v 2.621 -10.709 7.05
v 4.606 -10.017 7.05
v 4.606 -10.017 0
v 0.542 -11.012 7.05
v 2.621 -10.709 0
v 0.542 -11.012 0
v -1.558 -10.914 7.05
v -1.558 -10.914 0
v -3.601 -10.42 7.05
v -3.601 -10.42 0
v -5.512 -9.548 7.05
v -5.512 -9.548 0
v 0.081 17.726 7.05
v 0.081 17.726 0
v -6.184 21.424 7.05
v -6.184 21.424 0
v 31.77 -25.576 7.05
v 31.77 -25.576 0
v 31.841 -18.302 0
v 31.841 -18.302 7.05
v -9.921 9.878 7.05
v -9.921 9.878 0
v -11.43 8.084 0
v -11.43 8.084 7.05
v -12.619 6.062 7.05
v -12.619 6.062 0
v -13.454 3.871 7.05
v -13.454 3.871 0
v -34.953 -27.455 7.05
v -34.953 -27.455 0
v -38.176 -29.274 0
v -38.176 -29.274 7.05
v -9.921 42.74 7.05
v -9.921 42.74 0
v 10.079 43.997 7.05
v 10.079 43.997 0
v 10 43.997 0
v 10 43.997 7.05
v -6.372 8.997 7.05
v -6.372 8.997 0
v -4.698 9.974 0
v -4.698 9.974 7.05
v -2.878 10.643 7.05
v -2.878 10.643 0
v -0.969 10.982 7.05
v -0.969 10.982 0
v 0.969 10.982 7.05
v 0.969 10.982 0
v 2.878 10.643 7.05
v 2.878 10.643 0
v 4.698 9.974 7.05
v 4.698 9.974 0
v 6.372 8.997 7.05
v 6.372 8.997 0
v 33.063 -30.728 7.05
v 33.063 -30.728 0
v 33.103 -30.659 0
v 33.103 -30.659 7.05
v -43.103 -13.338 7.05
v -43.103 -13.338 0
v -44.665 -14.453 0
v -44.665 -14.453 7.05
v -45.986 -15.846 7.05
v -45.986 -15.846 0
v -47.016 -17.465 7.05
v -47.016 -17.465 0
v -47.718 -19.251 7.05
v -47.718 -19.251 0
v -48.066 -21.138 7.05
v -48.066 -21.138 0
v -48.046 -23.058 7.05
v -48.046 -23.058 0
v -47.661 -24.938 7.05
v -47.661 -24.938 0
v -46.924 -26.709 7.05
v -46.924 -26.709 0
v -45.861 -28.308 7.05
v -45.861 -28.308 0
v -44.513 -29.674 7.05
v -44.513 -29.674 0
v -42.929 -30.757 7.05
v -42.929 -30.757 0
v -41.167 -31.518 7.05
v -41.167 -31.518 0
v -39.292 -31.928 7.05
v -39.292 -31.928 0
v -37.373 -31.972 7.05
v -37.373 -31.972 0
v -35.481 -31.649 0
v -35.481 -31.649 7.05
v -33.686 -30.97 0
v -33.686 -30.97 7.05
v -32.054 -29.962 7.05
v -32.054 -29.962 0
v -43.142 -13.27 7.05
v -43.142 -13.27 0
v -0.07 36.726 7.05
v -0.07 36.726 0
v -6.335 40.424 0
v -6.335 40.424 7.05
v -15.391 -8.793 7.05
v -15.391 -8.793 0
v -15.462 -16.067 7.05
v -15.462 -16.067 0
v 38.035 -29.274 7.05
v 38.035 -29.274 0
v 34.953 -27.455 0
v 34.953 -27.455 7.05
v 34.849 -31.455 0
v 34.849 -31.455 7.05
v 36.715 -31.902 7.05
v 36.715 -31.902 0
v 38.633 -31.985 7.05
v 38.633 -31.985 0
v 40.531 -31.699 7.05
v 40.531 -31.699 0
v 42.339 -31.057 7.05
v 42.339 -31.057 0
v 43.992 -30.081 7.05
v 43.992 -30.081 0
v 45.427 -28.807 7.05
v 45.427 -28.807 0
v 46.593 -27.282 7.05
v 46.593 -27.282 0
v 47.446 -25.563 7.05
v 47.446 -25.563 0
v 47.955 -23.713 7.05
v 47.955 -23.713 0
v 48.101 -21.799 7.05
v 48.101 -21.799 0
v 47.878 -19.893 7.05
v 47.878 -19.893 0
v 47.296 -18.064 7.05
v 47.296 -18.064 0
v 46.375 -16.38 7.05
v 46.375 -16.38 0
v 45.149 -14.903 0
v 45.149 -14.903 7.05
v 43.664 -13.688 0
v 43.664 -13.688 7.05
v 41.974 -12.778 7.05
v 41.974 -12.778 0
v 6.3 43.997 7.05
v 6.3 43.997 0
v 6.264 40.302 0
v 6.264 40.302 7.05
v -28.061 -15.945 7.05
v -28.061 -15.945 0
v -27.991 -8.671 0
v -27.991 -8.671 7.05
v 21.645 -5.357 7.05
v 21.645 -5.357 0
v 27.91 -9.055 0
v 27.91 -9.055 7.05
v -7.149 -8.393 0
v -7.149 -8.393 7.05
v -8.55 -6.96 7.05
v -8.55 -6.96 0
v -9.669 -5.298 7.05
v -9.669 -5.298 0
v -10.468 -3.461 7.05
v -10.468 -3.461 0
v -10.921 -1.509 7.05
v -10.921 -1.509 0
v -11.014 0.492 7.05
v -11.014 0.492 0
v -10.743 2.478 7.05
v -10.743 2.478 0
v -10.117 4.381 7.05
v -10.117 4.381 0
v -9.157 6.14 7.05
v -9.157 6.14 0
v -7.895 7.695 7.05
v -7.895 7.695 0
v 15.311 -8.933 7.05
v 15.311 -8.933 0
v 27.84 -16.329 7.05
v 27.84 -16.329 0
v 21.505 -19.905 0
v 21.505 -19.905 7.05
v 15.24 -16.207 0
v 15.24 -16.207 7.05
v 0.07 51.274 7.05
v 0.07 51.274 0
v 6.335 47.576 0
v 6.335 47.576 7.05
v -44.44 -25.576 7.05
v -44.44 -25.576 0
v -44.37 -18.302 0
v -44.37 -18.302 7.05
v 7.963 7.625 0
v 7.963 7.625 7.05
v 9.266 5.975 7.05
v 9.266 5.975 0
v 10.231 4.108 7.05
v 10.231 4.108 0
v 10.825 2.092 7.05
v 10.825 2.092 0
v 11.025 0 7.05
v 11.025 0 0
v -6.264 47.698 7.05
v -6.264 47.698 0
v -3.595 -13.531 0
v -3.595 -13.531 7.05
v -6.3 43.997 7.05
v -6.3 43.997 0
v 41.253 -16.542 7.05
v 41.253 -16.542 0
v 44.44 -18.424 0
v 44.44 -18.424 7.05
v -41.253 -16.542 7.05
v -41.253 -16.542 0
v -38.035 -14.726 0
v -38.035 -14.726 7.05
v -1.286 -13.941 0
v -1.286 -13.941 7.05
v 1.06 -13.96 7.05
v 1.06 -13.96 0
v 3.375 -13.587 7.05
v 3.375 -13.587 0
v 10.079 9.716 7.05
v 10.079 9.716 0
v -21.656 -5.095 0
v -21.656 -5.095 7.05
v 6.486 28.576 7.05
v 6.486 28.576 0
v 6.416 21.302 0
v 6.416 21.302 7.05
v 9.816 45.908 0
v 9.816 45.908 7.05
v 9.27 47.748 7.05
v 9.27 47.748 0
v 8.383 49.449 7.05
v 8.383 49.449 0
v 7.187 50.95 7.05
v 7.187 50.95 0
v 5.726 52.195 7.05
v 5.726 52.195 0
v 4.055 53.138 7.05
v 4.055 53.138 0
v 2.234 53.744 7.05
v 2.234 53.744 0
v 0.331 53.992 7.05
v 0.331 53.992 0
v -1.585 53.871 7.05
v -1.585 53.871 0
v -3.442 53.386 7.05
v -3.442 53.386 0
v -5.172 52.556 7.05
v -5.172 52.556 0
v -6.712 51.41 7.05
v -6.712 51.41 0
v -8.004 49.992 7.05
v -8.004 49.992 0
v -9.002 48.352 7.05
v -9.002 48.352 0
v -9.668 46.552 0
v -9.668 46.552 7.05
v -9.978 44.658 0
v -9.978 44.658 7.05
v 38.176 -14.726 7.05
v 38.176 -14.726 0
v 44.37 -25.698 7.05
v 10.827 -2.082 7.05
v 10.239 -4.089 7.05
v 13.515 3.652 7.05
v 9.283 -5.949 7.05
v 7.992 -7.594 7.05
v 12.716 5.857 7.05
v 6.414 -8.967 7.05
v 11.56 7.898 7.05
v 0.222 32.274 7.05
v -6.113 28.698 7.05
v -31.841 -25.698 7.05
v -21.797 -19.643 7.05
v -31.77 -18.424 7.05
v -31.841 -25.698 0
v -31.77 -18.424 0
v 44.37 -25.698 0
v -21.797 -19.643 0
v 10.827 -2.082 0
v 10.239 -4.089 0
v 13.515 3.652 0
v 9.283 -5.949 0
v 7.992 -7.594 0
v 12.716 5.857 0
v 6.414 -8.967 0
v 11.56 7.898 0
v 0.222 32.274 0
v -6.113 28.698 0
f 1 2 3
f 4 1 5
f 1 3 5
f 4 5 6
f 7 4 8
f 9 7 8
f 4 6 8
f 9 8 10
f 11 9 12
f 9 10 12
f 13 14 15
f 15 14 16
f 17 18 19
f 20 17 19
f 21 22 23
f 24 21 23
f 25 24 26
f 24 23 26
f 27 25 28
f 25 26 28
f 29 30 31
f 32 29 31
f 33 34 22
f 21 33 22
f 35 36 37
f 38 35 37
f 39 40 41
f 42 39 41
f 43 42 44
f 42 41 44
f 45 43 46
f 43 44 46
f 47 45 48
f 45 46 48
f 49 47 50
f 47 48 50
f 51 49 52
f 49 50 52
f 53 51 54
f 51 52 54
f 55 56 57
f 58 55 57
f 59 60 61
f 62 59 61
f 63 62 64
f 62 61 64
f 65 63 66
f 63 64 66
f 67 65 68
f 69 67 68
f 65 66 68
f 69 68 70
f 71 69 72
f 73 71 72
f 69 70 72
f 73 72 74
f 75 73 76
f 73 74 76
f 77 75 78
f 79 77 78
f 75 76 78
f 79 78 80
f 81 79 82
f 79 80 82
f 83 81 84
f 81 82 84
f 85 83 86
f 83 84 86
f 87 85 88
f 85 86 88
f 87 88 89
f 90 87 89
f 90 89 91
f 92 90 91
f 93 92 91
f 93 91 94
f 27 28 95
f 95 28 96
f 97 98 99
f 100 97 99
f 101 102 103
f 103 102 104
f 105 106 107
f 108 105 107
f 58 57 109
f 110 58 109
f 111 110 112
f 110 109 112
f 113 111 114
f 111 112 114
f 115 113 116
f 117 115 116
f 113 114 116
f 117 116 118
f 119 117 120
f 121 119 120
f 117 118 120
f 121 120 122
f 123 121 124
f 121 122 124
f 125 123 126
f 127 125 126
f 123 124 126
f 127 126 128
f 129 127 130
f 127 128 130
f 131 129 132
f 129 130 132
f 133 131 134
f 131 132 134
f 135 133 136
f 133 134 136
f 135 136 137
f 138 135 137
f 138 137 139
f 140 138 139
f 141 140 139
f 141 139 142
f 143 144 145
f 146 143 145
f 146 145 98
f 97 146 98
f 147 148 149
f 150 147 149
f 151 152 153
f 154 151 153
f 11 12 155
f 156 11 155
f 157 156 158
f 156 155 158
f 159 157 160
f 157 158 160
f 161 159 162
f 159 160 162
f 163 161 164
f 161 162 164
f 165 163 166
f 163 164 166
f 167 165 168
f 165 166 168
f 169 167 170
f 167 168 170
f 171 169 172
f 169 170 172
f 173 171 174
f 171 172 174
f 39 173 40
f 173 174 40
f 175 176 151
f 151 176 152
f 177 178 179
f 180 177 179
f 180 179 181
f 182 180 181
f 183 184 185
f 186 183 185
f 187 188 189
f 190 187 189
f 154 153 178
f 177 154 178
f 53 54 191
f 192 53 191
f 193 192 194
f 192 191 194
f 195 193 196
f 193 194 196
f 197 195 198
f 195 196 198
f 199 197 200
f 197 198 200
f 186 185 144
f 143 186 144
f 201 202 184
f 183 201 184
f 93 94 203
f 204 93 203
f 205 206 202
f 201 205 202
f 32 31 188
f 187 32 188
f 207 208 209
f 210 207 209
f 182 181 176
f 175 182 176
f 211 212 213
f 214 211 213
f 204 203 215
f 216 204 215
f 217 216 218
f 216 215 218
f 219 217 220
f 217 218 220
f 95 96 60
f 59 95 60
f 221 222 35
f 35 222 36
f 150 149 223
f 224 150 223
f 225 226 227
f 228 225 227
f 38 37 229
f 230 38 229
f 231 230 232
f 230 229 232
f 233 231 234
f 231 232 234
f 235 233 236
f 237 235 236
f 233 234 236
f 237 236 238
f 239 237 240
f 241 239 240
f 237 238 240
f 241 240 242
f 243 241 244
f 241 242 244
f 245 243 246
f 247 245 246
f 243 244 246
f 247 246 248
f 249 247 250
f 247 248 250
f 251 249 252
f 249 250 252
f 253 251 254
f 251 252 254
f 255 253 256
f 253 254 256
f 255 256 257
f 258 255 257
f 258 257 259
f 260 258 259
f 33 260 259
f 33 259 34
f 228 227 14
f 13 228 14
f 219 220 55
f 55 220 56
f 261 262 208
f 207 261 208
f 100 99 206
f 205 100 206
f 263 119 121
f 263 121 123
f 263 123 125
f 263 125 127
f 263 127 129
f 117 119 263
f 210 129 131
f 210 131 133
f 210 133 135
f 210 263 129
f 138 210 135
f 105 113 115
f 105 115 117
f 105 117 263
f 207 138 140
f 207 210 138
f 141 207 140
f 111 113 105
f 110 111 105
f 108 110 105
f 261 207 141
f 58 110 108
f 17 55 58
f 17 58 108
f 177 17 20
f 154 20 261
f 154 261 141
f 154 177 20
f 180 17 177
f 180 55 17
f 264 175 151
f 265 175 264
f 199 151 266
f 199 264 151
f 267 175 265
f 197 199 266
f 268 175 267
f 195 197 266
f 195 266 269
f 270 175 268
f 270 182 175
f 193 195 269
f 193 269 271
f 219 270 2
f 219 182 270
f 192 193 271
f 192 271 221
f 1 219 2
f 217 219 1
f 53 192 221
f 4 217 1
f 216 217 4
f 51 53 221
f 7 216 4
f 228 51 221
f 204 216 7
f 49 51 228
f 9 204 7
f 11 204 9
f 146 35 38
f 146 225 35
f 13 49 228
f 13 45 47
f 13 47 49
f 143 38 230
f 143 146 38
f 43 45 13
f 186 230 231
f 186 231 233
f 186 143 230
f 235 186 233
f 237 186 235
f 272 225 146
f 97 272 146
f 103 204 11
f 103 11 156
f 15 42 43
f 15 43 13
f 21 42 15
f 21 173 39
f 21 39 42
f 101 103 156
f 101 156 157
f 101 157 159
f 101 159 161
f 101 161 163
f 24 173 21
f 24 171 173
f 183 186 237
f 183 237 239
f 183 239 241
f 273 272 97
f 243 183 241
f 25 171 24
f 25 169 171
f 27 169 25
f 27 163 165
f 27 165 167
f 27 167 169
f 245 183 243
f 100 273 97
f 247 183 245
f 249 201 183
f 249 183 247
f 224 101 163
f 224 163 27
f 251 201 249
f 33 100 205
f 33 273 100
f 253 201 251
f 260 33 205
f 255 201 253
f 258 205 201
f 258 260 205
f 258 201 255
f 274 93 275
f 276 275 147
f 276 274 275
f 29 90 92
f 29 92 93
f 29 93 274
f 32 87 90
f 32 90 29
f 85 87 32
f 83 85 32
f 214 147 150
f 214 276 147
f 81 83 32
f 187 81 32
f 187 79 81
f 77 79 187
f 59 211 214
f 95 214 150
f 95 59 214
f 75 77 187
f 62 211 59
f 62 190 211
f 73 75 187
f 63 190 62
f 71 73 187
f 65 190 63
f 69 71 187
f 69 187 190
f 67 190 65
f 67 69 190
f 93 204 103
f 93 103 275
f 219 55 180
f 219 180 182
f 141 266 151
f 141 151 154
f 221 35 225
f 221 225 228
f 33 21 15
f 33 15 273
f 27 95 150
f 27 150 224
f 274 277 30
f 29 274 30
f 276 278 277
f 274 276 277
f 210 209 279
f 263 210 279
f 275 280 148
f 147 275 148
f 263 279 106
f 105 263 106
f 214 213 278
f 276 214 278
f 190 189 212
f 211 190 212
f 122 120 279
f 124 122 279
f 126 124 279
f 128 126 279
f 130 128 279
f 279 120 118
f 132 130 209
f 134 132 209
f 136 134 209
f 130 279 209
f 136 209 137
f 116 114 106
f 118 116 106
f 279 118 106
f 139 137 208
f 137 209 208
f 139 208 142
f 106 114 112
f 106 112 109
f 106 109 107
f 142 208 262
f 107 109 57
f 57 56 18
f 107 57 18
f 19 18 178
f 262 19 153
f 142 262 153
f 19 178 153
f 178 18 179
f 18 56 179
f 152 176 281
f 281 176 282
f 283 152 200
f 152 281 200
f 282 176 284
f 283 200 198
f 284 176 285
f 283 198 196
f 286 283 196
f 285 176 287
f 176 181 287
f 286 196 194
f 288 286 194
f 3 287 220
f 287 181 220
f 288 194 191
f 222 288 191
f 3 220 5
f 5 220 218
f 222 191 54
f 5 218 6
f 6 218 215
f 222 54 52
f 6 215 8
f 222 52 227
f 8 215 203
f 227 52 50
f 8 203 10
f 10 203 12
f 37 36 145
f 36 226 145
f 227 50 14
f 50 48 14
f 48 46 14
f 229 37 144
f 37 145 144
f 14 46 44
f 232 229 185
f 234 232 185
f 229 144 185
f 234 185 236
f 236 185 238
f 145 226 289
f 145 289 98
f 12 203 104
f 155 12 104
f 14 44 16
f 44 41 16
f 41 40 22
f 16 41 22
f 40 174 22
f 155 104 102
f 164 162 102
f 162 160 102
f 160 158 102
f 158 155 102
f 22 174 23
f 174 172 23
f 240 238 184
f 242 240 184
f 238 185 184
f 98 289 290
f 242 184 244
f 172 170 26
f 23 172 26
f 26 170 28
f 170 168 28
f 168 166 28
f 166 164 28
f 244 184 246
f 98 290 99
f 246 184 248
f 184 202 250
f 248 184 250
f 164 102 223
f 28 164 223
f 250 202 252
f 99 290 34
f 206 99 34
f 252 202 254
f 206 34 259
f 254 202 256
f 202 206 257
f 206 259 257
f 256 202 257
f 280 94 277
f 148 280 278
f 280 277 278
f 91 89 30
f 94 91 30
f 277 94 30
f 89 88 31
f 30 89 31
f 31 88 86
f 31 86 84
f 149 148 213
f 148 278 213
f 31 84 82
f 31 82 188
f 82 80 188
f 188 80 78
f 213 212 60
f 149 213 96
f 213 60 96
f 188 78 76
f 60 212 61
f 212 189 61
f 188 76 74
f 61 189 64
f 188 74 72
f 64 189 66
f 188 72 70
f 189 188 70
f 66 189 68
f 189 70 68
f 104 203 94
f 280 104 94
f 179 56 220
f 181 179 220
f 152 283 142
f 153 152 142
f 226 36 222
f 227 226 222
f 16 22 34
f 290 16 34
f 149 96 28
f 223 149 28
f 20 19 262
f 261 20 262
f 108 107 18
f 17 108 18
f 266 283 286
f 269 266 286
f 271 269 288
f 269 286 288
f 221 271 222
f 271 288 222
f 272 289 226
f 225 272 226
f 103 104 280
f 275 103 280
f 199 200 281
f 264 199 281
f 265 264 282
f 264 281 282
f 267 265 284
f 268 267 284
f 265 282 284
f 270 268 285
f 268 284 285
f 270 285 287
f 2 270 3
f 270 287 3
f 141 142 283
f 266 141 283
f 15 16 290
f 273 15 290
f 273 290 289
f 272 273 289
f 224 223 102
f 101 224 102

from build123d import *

# Parameters (mm, degrees)
F1_DEPTH = 7.05
F2_COUNT = 3


with BuildPart() as f1:
    # F0 (on Top) → F1 (new body)
    with BuildSketch(Plane.XY):
        with BuildLine():
            ThreePointArc((10, 43.9972005226), (-0.6298612389, 53.9773445506), (-9.9206549639, 42.7399793461))
            Line((-9.9206549639, 42.7399793461), (-9.9206549639, 43.9972005226))
            Line((-9.9206549639, 43.9972005226), (-6.3003222272, 43.9972005226))
            Line((-6.3003222272, 43.9972005226), (-6.2644989641, 47.6981147533))
            Line((-6.2644989641, 47.6981147533), (0.0704118404, 51.2742726216))
            Line((0.0704118404, 51.2742726216), (6.3349108045, 47.5761578682))
            Line((6.3349108045, 47.5761578682), (6.3002680318, 43.9972005226))
            Line((6.3002680318, 43.9972005226), (10, 43.9972005226))
        make_face()
        with BuildLine():
            Line((-9.9206549639, 43.9972005226), (-9.9206549639, 42.7399793461))
            ThreePointArc((-9.9206549639, 42.7399793461), (0.6298612389, 34.0170564946), (10, 43.9972005226))
            Line((10, 43.9972005226), (6.3002680318, 43.9972005226))
            Line((6.3002680318, 43.9972005226), (6.2644989641, 40.3018852467))
            Line((6.2644989641, 40.3018852467), (-0.0704118404, 36.7257273784))
            Line((-0.0704118404, 36.7257273784), (-6.3349108045, 40.4238421318))
            Line((-6.3349108045, 40.4238421318), (-6.3003222272, 43.9972005226))
            Line((-6.3003222272, 43.9972005226), (-9.9206549639, 43.9972005226))
        make_face()
        with BuildLine():
            ThreePointArc((-9.9206549639, 9.878289583), (0.1133775368, 13.9995409044), (10.0793450361, 9.7163163619))
            Line((10.0793450361, 9.7163163619), (10.0793450361, 43.9972005226))
            Line((10.0793450361, 43.9972005226), (10, 43.9972005226))
            ThreePointArc((10, 43.9972005226), (0.6298612389, 34.0170564946), (-9.9206549639, 42.7399793461))
            Line((-9.9206549639, 42.7399793461), (-9.9206549639, 9.878289583))
        make_face()
        Polygon((6.4861108845, 28.5761578682), (6.415699044, 21.3018852467), (0.0807882395, 17.7257273784), (-6.1837107246, 21.4238421318), (-6.1132988842, 28.6981147533), (0.2216119204, 32.2742726216), align=None, mode=Mode.SUBTRACT)
        with BuildLine():
            ThreePointArc((6.3718920076, 8.9972005226), (9.7928732858, 5.0646083568), (11.025, 0))
            ThreePointArc((11.025, 0), (-5.0646083568, -9.7928732858), (-6.3718920076, 8.9972005226))
            Line((-6.3718920076, 8.9972005226), (-9.9206549639, 8.9972005226))
            Line((-9.9206549639, 8.9972005226), (-9.9206549639, 9.878289583))
            ThreePointArc((-9.9206549639, 9.878289583), (-5.3437267195, -12.9400380505), (14, 0))
            ThreePointArc((14, 0), (12.982889326, 5.2387579394), (10.0793450361, 9.7163163619))
            Line((10.0793450361, 9.7163163619), (10.0793450361, 8.9972005226))
            Line((10.0793450361, 8.9972005226), (6.3718920076, 8.9972005226))
        make_face()
        with BuildLine():
            ThreePointArc((-6.3718920076, 8.9972005226), (0, 11.025), (6.3718920076, 8.9972005226))
            Line((6.3718920076, 8.9972005226), (10.0793450361, 8.9972005226))
            Line((10.0793450361, 8.9972005226), (10.0793450361, 9.7163163619))
            ThreePointArc((10.0793450361, 9.7163163619), (0.1133775368, 13.9995409044), (-9.9206549639, 9.878289583))
            Line((-9.9206549639, 9.878289583), (-9.9206549639, 8.9972005226))
            Line((-9.9206549639, 8.9972005226), (-6.3718920076, 8.9972005226))
        make_face()
    extrude(amount=F1_DEPTH)

    # F2: F1 ×3 about axis
    f2_axis = Axis((0, 0, 0), (0, 0, -1))


with BuildPart() as f1_1:
    add(f1.part)
    for i in range(1, F2_COUNT):
        add(f1.part.rotate(f2_axis, i * 360 / F2_COUNT))


solid = f1_1.part
